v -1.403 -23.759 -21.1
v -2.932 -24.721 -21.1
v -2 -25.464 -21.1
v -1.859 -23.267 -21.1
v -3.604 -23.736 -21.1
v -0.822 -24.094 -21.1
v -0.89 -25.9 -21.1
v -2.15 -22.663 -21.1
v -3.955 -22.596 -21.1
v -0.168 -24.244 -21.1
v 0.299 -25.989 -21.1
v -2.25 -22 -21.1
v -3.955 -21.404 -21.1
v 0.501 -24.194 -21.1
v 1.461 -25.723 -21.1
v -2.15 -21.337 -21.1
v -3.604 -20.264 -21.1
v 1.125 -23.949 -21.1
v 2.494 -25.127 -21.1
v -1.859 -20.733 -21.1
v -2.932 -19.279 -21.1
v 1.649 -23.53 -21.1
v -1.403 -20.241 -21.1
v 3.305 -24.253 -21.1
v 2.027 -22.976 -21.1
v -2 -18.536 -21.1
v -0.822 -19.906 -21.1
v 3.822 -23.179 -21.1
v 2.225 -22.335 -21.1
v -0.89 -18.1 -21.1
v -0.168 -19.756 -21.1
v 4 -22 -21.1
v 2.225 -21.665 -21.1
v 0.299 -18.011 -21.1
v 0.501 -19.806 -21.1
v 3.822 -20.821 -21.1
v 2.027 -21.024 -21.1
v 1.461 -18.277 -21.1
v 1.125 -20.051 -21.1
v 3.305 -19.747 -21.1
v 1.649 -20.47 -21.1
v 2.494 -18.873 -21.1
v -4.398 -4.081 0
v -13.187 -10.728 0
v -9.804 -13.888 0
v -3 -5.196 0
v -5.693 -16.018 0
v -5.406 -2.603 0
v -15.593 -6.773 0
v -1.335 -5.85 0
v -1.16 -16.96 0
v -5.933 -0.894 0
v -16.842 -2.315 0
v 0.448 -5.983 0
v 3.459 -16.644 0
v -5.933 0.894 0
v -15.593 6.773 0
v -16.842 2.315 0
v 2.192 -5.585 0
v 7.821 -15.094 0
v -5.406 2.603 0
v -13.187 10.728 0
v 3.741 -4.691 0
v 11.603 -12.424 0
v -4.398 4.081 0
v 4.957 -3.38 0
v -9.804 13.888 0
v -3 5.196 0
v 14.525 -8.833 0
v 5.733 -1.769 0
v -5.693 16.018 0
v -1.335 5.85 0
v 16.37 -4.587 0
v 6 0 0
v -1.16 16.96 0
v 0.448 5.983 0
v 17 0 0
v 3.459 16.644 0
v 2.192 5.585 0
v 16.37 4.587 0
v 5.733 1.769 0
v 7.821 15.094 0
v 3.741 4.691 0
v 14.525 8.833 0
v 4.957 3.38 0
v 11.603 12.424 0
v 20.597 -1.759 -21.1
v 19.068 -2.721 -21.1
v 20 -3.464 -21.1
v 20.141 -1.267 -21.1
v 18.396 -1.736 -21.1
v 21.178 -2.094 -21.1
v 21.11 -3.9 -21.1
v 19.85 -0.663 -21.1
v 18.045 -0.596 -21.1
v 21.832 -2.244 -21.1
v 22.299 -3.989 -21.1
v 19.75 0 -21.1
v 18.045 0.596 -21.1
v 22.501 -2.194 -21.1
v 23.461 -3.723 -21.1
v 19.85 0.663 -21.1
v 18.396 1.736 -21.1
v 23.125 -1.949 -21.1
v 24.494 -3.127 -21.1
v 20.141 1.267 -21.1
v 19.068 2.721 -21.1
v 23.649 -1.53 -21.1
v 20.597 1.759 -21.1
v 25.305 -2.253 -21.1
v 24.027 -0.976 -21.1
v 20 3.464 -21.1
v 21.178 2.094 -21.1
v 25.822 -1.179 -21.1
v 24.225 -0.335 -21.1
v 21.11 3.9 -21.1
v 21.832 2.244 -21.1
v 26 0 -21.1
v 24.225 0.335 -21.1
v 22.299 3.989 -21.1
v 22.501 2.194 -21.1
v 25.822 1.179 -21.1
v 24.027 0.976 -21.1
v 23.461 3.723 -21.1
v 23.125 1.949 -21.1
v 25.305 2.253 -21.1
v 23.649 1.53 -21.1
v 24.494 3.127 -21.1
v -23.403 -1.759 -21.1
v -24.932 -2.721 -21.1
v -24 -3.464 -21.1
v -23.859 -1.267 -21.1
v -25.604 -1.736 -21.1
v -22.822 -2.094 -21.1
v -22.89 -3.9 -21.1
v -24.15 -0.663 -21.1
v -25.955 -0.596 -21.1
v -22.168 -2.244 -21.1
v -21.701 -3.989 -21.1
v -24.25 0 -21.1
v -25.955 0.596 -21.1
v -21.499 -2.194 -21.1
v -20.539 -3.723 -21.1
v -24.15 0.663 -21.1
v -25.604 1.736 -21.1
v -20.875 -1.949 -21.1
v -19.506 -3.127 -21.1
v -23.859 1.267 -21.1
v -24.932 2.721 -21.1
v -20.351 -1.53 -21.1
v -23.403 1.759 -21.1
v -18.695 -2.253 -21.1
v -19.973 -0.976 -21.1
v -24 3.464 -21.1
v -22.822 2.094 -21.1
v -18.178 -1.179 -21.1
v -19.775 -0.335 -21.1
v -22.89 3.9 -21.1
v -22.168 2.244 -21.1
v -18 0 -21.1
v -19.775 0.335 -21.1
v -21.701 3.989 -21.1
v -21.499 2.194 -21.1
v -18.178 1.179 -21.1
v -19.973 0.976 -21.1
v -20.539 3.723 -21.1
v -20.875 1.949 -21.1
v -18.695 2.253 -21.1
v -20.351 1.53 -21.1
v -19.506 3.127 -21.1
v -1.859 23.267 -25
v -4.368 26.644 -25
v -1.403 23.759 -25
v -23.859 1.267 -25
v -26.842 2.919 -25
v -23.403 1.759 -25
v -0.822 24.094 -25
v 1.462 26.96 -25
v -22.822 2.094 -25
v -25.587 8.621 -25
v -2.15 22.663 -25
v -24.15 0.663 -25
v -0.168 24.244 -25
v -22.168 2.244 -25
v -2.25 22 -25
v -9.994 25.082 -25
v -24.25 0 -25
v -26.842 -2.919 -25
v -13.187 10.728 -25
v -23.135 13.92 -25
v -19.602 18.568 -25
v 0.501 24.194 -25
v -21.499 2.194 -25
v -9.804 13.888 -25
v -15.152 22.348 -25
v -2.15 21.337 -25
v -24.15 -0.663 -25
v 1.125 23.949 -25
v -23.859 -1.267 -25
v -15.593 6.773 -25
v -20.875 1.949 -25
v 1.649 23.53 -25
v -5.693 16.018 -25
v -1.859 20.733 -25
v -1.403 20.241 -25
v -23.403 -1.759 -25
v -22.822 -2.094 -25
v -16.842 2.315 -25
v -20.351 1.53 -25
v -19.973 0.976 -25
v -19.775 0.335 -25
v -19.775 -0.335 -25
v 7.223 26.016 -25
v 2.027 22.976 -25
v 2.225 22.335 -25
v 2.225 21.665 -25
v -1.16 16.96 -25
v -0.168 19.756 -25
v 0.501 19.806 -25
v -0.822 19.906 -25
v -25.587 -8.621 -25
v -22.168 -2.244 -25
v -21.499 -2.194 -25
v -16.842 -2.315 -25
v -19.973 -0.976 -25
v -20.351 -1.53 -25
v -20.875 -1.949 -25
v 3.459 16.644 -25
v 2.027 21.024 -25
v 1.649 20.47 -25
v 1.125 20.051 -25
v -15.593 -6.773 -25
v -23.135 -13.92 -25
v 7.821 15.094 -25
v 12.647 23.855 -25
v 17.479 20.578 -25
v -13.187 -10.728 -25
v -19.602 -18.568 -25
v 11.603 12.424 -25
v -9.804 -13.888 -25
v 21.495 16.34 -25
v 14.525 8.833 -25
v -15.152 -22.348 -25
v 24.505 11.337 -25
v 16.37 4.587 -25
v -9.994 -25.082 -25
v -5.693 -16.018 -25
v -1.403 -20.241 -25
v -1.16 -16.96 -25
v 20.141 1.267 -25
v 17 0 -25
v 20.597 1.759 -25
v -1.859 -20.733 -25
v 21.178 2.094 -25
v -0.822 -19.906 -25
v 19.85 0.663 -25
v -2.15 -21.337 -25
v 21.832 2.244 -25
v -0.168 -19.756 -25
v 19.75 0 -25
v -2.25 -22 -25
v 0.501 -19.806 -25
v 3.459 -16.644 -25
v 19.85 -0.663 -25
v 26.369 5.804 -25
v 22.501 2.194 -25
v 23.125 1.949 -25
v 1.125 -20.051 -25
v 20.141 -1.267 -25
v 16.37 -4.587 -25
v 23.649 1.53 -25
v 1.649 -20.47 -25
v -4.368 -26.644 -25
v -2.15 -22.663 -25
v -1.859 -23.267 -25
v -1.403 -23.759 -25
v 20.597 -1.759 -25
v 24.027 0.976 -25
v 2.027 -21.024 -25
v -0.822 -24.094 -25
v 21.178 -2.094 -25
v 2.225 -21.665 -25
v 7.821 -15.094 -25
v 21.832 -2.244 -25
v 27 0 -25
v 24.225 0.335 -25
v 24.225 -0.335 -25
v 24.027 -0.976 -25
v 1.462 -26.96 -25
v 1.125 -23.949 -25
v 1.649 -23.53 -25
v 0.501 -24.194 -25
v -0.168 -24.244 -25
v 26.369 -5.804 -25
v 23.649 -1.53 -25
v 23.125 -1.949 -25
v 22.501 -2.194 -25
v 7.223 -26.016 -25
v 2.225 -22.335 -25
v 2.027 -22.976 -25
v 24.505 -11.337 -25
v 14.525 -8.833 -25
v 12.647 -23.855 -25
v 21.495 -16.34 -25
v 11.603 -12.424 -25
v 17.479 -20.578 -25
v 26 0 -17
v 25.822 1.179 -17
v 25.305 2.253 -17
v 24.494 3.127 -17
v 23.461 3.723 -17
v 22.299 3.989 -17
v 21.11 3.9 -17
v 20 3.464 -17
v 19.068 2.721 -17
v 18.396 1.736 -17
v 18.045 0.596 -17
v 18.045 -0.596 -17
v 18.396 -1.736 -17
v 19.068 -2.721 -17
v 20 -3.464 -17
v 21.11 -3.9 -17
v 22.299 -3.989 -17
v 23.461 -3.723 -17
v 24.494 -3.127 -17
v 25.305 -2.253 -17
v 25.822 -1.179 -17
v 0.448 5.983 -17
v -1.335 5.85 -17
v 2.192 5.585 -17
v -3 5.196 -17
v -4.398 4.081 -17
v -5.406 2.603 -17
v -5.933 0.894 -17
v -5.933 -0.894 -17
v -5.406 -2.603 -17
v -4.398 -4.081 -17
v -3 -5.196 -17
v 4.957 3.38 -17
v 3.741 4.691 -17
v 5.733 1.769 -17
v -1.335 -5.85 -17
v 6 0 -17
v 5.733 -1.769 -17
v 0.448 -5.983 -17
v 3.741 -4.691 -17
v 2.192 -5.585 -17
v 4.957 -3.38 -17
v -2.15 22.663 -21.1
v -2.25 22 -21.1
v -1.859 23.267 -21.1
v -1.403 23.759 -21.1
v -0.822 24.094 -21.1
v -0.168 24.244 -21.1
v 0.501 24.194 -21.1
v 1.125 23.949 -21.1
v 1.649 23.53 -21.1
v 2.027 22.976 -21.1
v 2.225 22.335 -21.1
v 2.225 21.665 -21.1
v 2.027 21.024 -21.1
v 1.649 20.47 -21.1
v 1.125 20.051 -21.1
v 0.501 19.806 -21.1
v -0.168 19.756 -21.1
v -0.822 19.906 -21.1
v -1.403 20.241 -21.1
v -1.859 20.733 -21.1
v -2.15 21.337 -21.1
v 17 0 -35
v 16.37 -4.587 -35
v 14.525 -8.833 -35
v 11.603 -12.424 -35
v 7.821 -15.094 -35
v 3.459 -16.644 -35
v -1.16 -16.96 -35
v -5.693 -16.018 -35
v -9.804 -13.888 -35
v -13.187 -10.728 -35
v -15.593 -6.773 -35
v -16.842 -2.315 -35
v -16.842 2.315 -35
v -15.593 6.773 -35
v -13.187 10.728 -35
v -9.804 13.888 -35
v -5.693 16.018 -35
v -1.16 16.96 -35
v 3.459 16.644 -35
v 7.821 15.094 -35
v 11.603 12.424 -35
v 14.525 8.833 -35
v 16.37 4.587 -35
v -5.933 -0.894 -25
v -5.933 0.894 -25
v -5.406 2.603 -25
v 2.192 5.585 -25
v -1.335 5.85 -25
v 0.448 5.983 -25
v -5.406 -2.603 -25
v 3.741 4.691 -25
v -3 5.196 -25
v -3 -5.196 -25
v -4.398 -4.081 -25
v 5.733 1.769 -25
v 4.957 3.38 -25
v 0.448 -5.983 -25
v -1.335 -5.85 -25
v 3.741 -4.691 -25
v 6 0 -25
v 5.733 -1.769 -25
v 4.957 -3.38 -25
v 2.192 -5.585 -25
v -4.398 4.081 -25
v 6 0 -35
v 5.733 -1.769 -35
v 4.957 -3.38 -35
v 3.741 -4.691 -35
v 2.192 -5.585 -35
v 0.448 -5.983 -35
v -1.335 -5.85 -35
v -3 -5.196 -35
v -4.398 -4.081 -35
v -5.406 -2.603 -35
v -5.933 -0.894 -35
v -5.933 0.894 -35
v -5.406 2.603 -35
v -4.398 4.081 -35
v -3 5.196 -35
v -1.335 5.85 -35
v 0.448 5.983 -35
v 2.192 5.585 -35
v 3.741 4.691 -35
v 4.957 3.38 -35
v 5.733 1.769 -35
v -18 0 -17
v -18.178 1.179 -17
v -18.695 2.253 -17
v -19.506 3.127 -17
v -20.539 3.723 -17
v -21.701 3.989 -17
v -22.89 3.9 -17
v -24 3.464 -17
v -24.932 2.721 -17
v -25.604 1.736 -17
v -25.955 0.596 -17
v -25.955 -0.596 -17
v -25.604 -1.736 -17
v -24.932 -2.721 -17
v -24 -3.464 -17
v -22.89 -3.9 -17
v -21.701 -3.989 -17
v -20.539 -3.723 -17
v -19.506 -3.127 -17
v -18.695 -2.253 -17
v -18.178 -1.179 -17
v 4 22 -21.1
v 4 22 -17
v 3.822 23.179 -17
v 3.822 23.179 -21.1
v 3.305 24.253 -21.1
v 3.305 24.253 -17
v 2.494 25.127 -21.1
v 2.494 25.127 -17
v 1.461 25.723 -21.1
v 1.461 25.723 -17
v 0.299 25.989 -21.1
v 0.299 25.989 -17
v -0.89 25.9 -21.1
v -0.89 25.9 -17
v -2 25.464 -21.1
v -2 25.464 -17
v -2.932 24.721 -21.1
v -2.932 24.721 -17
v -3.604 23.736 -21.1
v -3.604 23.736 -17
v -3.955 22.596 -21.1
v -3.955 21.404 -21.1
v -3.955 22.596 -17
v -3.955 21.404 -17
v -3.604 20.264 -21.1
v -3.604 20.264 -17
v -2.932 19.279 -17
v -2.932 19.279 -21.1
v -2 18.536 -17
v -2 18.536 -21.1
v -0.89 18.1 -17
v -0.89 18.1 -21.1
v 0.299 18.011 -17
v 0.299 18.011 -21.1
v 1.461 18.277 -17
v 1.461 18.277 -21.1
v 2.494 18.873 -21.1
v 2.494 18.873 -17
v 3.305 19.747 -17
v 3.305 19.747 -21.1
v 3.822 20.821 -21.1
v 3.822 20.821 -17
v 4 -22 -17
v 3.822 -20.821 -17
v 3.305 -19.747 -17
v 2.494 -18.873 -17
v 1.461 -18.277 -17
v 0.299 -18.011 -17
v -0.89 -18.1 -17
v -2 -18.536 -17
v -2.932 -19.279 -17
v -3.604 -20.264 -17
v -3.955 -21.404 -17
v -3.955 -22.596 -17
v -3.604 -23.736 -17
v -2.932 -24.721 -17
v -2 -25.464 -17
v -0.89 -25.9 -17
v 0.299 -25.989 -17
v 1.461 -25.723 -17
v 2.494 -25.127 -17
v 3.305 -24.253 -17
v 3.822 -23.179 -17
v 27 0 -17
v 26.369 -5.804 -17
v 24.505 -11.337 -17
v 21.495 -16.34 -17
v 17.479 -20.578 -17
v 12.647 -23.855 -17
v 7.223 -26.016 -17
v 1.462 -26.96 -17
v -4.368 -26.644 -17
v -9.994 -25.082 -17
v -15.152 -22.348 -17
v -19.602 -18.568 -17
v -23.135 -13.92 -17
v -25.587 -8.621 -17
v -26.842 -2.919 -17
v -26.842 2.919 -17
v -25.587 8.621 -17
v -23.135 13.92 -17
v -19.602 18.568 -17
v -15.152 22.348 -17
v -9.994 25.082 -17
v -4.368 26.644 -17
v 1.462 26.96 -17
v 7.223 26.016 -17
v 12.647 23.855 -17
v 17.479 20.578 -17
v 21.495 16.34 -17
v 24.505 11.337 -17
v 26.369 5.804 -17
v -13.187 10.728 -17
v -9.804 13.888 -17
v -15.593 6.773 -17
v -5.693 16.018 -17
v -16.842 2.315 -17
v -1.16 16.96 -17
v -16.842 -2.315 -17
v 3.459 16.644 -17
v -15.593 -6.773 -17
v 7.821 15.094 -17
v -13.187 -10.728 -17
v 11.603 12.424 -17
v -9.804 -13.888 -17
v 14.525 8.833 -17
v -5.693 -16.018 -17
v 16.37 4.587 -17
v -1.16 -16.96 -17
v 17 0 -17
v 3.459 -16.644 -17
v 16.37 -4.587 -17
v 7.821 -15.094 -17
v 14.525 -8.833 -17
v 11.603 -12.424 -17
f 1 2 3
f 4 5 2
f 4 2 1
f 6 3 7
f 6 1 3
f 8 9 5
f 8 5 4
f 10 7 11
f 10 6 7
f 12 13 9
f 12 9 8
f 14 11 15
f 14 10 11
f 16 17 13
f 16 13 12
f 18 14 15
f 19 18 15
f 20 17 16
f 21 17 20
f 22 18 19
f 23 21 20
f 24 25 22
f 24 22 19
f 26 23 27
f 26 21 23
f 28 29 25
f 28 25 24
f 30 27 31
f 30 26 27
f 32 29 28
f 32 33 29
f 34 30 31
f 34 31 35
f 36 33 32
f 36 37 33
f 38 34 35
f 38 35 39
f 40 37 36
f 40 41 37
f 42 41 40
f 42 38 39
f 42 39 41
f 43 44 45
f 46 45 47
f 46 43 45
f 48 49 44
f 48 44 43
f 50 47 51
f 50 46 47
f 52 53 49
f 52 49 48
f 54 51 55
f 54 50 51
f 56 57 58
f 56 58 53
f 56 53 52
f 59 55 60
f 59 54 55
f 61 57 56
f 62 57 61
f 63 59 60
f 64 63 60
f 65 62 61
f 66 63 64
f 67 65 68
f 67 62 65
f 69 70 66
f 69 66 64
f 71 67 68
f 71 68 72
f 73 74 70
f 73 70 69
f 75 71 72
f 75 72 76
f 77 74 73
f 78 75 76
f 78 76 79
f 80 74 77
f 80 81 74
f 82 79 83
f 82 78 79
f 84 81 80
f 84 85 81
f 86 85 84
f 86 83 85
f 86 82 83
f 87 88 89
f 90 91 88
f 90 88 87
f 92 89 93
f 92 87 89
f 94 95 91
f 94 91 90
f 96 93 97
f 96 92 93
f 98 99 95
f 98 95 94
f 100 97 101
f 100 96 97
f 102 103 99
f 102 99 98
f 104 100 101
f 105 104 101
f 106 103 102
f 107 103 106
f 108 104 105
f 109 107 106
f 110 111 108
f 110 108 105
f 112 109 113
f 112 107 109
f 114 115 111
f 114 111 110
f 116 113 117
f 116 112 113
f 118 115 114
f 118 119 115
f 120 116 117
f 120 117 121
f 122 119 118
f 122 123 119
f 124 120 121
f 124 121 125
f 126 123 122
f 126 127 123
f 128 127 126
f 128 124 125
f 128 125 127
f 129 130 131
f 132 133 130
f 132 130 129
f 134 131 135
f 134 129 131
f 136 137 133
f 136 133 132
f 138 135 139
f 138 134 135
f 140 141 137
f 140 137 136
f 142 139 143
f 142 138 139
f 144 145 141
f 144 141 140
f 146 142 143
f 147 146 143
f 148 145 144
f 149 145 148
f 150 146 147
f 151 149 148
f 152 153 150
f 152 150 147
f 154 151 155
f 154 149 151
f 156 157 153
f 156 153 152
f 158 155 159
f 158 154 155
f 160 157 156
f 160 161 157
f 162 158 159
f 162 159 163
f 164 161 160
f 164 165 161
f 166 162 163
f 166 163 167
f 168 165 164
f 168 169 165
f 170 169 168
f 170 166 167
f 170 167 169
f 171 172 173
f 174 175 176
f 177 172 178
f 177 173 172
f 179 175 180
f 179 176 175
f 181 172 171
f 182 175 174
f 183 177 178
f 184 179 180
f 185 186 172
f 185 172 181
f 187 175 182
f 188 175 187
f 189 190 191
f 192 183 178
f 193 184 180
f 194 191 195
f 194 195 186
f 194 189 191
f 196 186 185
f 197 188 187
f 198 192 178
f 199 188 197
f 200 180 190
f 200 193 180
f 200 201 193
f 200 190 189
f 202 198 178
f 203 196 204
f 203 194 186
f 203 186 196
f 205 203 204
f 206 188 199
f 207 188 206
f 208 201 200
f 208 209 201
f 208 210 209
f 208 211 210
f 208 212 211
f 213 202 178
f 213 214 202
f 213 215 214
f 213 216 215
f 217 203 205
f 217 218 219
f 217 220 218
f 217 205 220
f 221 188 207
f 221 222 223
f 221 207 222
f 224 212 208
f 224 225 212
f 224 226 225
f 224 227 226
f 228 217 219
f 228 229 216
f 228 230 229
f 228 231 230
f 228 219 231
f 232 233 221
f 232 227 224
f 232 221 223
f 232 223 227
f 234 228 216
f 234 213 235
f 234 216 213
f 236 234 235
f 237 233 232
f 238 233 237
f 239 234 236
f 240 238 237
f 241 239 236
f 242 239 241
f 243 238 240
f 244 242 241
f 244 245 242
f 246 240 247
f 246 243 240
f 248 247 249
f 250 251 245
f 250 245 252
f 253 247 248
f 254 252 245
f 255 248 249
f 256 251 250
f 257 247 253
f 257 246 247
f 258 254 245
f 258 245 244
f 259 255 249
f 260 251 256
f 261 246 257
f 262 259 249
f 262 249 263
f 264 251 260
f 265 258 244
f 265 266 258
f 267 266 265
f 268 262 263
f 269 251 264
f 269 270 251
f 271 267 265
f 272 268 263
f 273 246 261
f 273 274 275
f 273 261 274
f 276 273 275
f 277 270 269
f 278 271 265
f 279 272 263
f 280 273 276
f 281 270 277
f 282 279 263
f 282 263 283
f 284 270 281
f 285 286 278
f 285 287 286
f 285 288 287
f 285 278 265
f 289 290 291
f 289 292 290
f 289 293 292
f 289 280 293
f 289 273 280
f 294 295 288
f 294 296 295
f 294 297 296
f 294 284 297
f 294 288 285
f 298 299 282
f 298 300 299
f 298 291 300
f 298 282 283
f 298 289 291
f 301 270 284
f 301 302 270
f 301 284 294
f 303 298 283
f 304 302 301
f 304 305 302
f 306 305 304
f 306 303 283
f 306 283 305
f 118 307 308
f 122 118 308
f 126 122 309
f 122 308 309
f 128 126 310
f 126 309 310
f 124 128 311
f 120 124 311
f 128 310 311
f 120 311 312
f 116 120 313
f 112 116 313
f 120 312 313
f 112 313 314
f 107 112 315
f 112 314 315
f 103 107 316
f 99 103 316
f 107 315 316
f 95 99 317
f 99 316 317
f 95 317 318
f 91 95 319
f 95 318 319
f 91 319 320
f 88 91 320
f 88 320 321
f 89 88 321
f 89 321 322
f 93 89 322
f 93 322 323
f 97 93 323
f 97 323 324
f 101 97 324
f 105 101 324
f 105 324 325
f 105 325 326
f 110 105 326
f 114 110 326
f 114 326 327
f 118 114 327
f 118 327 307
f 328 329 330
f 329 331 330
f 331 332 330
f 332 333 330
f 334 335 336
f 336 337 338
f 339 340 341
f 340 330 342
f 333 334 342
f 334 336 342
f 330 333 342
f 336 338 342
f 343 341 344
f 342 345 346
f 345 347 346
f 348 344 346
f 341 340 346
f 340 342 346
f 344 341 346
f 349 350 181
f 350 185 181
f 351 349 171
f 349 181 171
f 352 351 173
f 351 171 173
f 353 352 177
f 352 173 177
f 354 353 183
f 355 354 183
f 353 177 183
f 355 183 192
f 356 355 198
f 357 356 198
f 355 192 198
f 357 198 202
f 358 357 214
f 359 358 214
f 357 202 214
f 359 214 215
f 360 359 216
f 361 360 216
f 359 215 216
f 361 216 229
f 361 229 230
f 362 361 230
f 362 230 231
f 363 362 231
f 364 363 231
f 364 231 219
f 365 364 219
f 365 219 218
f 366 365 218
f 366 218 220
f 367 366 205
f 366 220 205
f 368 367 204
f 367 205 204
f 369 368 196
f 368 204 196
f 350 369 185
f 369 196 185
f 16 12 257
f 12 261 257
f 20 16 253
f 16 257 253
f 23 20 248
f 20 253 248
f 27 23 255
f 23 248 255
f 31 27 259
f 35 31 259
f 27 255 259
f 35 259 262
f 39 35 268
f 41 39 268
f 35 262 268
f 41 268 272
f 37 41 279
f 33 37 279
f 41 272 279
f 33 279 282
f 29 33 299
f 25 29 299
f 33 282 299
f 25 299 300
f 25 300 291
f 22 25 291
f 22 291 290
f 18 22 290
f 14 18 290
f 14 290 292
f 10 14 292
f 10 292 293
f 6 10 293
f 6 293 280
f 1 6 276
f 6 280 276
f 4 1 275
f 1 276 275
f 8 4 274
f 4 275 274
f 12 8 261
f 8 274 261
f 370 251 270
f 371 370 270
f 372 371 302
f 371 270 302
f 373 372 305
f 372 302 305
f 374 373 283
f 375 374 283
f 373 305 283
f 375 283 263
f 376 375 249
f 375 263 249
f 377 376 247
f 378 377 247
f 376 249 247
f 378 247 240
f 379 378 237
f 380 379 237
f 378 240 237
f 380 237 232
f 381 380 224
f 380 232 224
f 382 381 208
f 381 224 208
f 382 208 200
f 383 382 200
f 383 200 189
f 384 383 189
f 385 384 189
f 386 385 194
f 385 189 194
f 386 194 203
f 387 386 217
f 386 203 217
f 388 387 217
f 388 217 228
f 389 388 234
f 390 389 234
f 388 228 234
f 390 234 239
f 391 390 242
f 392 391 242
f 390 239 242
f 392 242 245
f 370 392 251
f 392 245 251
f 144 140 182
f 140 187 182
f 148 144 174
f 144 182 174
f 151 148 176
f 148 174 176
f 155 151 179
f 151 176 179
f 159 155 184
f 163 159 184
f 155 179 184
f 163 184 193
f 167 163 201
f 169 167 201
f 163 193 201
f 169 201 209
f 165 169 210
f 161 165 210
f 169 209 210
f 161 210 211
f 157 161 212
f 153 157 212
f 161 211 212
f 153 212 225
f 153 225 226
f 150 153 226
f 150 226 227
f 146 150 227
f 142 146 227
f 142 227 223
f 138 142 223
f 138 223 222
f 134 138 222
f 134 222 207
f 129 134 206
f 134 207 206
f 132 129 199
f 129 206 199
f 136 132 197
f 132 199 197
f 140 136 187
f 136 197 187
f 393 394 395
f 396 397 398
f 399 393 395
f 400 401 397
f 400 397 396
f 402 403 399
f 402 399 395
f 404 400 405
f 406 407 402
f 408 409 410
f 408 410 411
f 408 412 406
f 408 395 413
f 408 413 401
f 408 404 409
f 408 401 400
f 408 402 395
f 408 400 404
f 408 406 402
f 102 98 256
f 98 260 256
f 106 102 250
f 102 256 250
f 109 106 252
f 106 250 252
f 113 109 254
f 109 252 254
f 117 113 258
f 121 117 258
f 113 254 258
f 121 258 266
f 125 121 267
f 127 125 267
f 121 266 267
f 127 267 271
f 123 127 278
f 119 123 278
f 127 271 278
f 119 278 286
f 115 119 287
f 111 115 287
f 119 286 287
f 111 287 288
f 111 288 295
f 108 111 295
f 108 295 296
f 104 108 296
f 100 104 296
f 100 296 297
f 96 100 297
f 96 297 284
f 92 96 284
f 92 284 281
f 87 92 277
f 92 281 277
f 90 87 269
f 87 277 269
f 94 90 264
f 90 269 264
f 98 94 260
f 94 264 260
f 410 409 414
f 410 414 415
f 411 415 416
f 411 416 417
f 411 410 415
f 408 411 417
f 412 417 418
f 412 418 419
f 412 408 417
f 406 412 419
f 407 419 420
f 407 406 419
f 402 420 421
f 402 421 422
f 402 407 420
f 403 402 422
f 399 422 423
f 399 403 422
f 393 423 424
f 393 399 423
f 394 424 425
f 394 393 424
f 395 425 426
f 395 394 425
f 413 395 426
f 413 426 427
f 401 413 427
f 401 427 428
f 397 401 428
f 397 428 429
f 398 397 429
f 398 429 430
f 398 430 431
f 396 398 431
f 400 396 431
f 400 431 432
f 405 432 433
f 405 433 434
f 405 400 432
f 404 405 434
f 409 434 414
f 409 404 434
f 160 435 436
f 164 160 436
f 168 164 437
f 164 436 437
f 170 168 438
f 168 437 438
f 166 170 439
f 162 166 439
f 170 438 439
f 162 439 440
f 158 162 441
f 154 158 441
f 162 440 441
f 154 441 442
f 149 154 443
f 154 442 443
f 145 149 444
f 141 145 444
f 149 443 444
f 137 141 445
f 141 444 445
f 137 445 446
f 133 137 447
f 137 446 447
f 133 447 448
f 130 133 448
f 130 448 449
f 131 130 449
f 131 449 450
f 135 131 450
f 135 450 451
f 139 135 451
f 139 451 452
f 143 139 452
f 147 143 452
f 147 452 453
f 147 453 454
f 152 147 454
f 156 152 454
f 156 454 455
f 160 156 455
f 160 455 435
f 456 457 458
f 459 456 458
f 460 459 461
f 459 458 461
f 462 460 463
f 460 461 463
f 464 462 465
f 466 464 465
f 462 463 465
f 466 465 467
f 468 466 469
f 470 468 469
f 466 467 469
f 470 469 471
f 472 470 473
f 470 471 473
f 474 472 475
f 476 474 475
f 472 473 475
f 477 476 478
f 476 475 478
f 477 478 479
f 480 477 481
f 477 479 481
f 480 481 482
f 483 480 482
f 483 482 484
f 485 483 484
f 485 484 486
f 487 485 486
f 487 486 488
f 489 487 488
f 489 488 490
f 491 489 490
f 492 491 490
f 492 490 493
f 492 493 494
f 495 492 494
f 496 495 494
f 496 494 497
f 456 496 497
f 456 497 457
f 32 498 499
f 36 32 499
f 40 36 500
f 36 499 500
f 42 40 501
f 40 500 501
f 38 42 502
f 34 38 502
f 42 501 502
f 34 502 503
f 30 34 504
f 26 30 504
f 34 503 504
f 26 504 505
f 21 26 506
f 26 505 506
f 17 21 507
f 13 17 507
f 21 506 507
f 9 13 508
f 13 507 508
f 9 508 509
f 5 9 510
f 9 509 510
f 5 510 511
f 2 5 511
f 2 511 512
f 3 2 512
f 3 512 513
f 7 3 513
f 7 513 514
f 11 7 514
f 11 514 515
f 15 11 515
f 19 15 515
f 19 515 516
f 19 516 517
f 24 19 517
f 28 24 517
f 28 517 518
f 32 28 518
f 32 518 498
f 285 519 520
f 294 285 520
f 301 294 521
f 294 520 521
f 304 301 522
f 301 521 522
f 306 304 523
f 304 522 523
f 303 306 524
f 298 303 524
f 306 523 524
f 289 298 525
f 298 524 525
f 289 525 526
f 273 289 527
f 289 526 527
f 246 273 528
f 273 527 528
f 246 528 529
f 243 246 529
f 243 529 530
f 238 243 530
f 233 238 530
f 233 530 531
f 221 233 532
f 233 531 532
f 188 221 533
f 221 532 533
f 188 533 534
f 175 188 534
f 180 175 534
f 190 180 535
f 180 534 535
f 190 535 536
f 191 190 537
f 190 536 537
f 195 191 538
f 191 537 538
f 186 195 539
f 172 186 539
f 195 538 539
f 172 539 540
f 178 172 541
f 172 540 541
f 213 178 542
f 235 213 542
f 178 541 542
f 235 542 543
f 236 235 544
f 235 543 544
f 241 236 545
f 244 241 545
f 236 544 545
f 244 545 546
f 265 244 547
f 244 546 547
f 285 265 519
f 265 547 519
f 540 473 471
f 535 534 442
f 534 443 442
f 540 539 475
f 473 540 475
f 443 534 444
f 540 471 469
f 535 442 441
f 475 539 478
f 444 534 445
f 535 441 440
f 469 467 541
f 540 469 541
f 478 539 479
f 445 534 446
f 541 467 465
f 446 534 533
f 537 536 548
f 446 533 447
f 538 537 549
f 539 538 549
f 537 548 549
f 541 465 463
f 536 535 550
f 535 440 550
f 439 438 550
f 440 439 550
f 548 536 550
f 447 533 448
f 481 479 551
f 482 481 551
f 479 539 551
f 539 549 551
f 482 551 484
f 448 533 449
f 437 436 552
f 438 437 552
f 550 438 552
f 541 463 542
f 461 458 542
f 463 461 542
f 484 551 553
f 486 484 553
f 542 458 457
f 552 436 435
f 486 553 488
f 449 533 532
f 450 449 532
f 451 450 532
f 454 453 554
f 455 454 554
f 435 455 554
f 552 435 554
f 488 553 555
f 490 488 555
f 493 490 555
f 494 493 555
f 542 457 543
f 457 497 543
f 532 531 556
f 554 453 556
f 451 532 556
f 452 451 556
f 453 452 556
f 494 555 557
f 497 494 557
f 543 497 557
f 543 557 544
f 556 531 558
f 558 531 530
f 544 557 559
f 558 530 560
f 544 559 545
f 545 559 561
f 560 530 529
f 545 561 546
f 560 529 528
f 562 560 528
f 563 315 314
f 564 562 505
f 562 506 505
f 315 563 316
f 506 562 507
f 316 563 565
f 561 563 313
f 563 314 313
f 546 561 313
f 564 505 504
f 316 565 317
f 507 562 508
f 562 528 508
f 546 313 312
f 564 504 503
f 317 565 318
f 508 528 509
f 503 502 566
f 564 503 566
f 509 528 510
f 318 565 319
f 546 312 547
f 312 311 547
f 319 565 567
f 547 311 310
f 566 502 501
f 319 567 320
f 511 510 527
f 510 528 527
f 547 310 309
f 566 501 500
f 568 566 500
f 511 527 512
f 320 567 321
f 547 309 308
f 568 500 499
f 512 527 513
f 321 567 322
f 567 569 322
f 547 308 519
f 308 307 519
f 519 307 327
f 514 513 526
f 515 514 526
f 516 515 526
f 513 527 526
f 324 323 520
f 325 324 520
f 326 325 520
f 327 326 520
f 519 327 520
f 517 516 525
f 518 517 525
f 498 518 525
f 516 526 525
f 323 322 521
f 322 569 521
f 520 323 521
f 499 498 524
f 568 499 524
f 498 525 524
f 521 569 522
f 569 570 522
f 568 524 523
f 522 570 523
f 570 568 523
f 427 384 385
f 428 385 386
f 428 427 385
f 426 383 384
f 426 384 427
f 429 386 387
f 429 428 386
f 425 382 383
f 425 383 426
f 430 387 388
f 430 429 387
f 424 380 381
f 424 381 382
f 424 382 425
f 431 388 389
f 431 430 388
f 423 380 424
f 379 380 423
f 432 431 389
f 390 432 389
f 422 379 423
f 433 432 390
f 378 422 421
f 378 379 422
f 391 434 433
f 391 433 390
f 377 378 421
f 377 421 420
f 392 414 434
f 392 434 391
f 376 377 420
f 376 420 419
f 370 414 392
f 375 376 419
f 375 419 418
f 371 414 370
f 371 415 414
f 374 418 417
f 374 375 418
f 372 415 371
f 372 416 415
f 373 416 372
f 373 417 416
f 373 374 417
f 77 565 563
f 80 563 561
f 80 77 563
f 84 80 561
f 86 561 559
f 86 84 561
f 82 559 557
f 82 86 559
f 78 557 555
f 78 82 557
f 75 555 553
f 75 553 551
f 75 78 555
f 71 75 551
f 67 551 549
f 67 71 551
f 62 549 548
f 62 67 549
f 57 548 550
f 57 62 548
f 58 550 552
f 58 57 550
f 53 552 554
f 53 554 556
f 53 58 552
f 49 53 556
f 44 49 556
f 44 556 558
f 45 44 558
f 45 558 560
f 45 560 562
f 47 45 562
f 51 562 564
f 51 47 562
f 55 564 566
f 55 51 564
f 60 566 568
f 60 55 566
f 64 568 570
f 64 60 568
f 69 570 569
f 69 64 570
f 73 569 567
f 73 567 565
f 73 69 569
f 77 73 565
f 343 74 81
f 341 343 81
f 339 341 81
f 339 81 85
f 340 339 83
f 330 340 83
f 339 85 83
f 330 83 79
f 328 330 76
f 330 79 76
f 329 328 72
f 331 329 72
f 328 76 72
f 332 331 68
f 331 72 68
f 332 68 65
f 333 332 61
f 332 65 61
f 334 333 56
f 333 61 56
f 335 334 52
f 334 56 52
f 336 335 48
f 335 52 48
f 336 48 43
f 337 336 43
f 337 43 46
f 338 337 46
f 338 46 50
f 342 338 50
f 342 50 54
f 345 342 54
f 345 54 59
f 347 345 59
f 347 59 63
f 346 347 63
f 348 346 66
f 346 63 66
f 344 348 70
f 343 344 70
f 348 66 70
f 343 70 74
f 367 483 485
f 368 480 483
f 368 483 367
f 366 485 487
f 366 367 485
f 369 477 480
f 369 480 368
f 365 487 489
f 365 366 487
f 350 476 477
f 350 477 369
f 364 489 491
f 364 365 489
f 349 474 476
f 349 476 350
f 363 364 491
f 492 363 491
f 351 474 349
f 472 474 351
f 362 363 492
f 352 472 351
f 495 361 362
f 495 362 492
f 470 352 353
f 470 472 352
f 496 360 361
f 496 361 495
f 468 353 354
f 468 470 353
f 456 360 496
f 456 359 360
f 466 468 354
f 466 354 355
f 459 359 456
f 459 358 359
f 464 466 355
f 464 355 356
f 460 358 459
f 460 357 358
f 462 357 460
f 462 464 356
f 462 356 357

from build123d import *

# Parameters (mm, degrees)
F0_R           = 17
F0_R_2         = 6
F1_DEPTH       = 17
F2_R           = 27
F3_DEPTH       = 8
F4_R           = 17
F4_R_2         = 6
F5_DEPTH       = 10
F7_D           = 4.5
F7_CBORE_D     = 8
F7_CBORE_DEPTH = 4.1


with BuildPart() as f1:
    # F0 (on Top) → F1 (new body)
    with BuildSketch(Plane.XY):
        Circle(F0_R)
        Circle(F0_R_2, mode=Mode.SUBTRACT)
    extrude(amount=-F1_DEPTH)

    # F2 (on face) → F3 (join)
    with BuildSketch(Plane(origin=(0, 0, -17), x_dir=(1, 0, 0), z_dir=(0, 0, -1))):
        Circle(F2_R)
    extrude(amount=F3_DEPTH)

    # F4 (on face) → F5 (join)
    with BuildSketch(Plane(origin=(0, 0, -25), x_dir=(1, 0, 0), z_dir=(0, 0, -1))):
        Circle(F4_R)
        Circle(F4_R_2, mode=Mode.SUBTRACT)
    extrude(amount=F5_DEPTH)

    # F7 (through all)
    with Locations(Plane.XY.offset(-17)):
        with Locations((0, 22), (-22, 0), (0, -22), (22, 0)):
            CounterBoreHole(F7_D / 2, F7_CBORE_D / 2, F7_CBORE_DEPTH)


solid = f1.part
